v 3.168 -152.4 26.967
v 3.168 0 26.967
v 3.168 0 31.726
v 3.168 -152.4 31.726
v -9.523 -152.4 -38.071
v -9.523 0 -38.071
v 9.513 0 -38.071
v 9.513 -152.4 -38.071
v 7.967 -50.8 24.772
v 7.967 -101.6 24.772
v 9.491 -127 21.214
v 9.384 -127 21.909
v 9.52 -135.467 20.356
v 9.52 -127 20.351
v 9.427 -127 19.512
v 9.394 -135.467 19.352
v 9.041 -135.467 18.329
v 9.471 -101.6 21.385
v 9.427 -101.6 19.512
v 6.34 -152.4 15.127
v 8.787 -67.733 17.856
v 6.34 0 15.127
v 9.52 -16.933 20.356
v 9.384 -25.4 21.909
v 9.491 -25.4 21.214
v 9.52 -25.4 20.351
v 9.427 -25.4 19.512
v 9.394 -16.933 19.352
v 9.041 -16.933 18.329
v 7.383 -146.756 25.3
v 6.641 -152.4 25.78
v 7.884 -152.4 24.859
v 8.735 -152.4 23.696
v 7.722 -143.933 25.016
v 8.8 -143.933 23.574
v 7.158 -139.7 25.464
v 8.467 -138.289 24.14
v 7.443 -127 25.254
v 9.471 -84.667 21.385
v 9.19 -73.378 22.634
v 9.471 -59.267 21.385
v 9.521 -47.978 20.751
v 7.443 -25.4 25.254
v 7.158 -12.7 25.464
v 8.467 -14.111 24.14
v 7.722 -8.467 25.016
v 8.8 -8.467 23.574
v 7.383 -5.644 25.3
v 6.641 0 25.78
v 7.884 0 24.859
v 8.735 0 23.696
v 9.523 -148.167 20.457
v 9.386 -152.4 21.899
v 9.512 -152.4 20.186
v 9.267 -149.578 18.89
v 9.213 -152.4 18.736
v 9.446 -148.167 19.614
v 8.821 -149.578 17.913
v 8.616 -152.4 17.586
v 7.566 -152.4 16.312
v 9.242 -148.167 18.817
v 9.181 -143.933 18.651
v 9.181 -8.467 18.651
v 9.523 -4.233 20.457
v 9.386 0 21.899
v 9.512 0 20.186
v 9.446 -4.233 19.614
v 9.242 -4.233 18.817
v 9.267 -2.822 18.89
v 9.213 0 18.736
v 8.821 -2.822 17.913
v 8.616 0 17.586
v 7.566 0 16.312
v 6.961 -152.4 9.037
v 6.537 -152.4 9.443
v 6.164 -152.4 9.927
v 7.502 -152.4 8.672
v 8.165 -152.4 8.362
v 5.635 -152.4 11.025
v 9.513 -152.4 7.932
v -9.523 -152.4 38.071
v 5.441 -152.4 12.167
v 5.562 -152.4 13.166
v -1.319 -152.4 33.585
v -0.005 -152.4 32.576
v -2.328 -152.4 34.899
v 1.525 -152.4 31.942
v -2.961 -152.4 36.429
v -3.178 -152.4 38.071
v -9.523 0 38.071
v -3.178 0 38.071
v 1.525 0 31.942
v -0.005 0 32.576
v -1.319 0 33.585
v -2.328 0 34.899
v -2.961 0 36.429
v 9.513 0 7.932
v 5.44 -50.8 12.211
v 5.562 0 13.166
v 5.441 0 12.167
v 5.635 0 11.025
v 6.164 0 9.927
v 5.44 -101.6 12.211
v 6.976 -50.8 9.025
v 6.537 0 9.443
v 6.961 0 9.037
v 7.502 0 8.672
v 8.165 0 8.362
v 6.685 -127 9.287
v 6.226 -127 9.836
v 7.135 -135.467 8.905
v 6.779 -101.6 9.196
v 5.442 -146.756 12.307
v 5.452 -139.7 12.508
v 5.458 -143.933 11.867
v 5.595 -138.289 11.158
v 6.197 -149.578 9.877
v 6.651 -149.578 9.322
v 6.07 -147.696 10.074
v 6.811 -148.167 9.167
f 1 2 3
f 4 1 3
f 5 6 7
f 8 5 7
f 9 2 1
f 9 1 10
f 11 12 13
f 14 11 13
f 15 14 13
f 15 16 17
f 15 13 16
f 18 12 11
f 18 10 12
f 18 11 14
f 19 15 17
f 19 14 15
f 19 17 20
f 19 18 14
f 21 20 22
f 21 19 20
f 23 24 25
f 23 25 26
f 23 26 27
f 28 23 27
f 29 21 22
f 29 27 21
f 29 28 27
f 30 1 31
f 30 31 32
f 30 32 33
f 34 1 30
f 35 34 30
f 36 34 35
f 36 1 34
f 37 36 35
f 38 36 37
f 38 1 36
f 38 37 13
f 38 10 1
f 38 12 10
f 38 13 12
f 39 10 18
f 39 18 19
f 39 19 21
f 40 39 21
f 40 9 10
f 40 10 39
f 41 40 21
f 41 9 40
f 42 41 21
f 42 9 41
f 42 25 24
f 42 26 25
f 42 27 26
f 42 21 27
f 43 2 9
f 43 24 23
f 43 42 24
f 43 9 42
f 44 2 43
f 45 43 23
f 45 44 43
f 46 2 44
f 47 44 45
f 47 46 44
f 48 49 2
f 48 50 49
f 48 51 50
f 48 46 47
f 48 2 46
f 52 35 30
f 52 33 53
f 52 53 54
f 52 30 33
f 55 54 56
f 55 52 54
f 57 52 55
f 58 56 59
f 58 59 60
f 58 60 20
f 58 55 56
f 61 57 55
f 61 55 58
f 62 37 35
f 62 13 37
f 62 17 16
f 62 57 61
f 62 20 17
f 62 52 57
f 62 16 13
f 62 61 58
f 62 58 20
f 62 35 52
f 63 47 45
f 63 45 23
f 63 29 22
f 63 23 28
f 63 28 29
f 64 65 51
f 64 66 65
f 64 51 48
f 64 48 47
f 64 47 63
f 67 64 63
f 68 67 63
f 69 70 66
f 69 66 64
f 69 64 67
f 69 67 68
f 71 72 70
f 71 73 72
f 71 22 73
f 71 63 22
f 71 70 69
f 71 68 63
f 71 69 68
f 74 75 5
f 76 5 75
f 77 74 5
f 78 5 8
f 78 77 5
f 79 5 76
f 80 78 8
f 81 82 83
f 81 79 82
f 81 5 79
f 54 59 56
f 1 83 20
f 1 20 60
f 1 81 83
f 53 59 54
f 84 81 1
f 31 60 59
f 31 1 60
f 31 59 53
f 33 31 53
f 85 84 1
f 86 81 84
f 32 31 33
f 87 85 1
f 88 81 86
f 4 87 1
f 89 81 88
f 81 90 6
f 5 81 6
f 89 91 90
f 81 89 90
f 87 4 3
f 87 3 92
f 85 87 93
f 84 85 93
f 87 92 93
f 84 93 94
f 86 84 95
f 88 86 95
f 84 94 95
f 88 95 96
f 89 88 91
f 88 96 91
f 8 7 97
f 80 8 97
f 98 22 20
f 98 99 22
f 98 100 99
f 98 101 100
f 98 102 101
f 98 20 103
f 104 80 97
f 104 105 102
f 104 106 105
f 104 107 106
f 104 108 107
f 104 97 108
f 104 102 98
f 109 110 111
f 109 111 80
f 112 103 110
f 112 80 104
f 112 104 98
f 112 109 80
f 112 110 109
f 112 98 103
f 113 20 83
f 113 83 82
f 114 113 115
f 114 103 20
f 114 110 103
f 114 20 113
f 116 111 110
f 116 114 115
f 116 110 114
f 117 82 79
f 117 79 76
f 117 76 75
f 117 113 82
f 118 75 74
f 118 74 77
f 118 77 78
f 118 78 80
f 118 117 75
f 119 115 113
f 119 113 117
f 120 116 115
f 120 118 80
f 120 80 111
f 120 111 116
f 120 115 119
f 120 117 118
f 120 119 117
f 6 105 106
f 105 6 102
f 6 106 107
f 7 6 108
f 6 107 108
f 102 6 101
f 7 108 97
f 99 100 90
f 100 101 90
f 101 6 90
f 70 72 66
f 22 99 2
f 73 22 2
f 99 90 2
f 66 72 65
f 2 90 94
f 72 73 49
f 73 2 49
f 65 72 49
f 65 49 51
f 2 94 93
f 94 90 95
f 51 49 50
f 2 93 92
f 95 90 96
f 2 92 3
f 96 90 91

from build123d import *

# Parameters (mm, degrees)
F1_DEPTH = 152.4


# Not quite as in the source:
# - ends of sketch curves that miss each other by under 0.0002 mm in the source are joined
# - the dataset's text gives a spline's control points without its knots; the knots are read off the source's solid


with BuildPart() as f1:
    # F0 (on Front) → F1 (new body)
    with BuildSketch(Plane.XZ):
        with BuildLine():
            Line((9.5127572, -38.0712472), (9.5127572, 7.931531))
            add(Edge.make_bspline(
                [(6.3401448, 15.1268176), (5.8891424, 14.1770608), (4.9154588, 12.1265696), (6.532499, 8.7763096), (8.6041992, 8.1890616), (9.5127572, 7.931531)],
                knots=[0, 0, 0, 0, 0.120135, 0.259368, 0.368128, 0.368128, 0.368128, 0.368128], degree=3))
            add(Edge.make_bspline(
                [(3.1675578, 26.9671546), (4.9711102, 26.507059), (8.7999316, 25.5303274), (10.3429562, 18.8598302), (7.5847956, 16.2875722), (6.3401448, 15.1268176)],
                knots=[0, 0, 0, 0, 0.207787, 0.441117, 0.632993, 0.632993, 0.632993, 0.632993], degree=3))
            Line((3.1675578, 26.9671546), (3.1675578, 31.7260478))
            ThreePointArc((3.1675578, 31.7260478), (-1.3191757237, 33.5845390763), (-3.1776416, 38.0712726))
            Line((-3.1776416, 38.0712726), (-9.5228664, 38.0712726))
            Line((-9.5228664, 38.0712726), (-9.5228664, -38.0712472))
            Line((-9.5228664, -38.0712472), (9.5127572, -38.0712472))
        make_face()
    extrude(amount=F1_DEPTH)


solid = f1.part
